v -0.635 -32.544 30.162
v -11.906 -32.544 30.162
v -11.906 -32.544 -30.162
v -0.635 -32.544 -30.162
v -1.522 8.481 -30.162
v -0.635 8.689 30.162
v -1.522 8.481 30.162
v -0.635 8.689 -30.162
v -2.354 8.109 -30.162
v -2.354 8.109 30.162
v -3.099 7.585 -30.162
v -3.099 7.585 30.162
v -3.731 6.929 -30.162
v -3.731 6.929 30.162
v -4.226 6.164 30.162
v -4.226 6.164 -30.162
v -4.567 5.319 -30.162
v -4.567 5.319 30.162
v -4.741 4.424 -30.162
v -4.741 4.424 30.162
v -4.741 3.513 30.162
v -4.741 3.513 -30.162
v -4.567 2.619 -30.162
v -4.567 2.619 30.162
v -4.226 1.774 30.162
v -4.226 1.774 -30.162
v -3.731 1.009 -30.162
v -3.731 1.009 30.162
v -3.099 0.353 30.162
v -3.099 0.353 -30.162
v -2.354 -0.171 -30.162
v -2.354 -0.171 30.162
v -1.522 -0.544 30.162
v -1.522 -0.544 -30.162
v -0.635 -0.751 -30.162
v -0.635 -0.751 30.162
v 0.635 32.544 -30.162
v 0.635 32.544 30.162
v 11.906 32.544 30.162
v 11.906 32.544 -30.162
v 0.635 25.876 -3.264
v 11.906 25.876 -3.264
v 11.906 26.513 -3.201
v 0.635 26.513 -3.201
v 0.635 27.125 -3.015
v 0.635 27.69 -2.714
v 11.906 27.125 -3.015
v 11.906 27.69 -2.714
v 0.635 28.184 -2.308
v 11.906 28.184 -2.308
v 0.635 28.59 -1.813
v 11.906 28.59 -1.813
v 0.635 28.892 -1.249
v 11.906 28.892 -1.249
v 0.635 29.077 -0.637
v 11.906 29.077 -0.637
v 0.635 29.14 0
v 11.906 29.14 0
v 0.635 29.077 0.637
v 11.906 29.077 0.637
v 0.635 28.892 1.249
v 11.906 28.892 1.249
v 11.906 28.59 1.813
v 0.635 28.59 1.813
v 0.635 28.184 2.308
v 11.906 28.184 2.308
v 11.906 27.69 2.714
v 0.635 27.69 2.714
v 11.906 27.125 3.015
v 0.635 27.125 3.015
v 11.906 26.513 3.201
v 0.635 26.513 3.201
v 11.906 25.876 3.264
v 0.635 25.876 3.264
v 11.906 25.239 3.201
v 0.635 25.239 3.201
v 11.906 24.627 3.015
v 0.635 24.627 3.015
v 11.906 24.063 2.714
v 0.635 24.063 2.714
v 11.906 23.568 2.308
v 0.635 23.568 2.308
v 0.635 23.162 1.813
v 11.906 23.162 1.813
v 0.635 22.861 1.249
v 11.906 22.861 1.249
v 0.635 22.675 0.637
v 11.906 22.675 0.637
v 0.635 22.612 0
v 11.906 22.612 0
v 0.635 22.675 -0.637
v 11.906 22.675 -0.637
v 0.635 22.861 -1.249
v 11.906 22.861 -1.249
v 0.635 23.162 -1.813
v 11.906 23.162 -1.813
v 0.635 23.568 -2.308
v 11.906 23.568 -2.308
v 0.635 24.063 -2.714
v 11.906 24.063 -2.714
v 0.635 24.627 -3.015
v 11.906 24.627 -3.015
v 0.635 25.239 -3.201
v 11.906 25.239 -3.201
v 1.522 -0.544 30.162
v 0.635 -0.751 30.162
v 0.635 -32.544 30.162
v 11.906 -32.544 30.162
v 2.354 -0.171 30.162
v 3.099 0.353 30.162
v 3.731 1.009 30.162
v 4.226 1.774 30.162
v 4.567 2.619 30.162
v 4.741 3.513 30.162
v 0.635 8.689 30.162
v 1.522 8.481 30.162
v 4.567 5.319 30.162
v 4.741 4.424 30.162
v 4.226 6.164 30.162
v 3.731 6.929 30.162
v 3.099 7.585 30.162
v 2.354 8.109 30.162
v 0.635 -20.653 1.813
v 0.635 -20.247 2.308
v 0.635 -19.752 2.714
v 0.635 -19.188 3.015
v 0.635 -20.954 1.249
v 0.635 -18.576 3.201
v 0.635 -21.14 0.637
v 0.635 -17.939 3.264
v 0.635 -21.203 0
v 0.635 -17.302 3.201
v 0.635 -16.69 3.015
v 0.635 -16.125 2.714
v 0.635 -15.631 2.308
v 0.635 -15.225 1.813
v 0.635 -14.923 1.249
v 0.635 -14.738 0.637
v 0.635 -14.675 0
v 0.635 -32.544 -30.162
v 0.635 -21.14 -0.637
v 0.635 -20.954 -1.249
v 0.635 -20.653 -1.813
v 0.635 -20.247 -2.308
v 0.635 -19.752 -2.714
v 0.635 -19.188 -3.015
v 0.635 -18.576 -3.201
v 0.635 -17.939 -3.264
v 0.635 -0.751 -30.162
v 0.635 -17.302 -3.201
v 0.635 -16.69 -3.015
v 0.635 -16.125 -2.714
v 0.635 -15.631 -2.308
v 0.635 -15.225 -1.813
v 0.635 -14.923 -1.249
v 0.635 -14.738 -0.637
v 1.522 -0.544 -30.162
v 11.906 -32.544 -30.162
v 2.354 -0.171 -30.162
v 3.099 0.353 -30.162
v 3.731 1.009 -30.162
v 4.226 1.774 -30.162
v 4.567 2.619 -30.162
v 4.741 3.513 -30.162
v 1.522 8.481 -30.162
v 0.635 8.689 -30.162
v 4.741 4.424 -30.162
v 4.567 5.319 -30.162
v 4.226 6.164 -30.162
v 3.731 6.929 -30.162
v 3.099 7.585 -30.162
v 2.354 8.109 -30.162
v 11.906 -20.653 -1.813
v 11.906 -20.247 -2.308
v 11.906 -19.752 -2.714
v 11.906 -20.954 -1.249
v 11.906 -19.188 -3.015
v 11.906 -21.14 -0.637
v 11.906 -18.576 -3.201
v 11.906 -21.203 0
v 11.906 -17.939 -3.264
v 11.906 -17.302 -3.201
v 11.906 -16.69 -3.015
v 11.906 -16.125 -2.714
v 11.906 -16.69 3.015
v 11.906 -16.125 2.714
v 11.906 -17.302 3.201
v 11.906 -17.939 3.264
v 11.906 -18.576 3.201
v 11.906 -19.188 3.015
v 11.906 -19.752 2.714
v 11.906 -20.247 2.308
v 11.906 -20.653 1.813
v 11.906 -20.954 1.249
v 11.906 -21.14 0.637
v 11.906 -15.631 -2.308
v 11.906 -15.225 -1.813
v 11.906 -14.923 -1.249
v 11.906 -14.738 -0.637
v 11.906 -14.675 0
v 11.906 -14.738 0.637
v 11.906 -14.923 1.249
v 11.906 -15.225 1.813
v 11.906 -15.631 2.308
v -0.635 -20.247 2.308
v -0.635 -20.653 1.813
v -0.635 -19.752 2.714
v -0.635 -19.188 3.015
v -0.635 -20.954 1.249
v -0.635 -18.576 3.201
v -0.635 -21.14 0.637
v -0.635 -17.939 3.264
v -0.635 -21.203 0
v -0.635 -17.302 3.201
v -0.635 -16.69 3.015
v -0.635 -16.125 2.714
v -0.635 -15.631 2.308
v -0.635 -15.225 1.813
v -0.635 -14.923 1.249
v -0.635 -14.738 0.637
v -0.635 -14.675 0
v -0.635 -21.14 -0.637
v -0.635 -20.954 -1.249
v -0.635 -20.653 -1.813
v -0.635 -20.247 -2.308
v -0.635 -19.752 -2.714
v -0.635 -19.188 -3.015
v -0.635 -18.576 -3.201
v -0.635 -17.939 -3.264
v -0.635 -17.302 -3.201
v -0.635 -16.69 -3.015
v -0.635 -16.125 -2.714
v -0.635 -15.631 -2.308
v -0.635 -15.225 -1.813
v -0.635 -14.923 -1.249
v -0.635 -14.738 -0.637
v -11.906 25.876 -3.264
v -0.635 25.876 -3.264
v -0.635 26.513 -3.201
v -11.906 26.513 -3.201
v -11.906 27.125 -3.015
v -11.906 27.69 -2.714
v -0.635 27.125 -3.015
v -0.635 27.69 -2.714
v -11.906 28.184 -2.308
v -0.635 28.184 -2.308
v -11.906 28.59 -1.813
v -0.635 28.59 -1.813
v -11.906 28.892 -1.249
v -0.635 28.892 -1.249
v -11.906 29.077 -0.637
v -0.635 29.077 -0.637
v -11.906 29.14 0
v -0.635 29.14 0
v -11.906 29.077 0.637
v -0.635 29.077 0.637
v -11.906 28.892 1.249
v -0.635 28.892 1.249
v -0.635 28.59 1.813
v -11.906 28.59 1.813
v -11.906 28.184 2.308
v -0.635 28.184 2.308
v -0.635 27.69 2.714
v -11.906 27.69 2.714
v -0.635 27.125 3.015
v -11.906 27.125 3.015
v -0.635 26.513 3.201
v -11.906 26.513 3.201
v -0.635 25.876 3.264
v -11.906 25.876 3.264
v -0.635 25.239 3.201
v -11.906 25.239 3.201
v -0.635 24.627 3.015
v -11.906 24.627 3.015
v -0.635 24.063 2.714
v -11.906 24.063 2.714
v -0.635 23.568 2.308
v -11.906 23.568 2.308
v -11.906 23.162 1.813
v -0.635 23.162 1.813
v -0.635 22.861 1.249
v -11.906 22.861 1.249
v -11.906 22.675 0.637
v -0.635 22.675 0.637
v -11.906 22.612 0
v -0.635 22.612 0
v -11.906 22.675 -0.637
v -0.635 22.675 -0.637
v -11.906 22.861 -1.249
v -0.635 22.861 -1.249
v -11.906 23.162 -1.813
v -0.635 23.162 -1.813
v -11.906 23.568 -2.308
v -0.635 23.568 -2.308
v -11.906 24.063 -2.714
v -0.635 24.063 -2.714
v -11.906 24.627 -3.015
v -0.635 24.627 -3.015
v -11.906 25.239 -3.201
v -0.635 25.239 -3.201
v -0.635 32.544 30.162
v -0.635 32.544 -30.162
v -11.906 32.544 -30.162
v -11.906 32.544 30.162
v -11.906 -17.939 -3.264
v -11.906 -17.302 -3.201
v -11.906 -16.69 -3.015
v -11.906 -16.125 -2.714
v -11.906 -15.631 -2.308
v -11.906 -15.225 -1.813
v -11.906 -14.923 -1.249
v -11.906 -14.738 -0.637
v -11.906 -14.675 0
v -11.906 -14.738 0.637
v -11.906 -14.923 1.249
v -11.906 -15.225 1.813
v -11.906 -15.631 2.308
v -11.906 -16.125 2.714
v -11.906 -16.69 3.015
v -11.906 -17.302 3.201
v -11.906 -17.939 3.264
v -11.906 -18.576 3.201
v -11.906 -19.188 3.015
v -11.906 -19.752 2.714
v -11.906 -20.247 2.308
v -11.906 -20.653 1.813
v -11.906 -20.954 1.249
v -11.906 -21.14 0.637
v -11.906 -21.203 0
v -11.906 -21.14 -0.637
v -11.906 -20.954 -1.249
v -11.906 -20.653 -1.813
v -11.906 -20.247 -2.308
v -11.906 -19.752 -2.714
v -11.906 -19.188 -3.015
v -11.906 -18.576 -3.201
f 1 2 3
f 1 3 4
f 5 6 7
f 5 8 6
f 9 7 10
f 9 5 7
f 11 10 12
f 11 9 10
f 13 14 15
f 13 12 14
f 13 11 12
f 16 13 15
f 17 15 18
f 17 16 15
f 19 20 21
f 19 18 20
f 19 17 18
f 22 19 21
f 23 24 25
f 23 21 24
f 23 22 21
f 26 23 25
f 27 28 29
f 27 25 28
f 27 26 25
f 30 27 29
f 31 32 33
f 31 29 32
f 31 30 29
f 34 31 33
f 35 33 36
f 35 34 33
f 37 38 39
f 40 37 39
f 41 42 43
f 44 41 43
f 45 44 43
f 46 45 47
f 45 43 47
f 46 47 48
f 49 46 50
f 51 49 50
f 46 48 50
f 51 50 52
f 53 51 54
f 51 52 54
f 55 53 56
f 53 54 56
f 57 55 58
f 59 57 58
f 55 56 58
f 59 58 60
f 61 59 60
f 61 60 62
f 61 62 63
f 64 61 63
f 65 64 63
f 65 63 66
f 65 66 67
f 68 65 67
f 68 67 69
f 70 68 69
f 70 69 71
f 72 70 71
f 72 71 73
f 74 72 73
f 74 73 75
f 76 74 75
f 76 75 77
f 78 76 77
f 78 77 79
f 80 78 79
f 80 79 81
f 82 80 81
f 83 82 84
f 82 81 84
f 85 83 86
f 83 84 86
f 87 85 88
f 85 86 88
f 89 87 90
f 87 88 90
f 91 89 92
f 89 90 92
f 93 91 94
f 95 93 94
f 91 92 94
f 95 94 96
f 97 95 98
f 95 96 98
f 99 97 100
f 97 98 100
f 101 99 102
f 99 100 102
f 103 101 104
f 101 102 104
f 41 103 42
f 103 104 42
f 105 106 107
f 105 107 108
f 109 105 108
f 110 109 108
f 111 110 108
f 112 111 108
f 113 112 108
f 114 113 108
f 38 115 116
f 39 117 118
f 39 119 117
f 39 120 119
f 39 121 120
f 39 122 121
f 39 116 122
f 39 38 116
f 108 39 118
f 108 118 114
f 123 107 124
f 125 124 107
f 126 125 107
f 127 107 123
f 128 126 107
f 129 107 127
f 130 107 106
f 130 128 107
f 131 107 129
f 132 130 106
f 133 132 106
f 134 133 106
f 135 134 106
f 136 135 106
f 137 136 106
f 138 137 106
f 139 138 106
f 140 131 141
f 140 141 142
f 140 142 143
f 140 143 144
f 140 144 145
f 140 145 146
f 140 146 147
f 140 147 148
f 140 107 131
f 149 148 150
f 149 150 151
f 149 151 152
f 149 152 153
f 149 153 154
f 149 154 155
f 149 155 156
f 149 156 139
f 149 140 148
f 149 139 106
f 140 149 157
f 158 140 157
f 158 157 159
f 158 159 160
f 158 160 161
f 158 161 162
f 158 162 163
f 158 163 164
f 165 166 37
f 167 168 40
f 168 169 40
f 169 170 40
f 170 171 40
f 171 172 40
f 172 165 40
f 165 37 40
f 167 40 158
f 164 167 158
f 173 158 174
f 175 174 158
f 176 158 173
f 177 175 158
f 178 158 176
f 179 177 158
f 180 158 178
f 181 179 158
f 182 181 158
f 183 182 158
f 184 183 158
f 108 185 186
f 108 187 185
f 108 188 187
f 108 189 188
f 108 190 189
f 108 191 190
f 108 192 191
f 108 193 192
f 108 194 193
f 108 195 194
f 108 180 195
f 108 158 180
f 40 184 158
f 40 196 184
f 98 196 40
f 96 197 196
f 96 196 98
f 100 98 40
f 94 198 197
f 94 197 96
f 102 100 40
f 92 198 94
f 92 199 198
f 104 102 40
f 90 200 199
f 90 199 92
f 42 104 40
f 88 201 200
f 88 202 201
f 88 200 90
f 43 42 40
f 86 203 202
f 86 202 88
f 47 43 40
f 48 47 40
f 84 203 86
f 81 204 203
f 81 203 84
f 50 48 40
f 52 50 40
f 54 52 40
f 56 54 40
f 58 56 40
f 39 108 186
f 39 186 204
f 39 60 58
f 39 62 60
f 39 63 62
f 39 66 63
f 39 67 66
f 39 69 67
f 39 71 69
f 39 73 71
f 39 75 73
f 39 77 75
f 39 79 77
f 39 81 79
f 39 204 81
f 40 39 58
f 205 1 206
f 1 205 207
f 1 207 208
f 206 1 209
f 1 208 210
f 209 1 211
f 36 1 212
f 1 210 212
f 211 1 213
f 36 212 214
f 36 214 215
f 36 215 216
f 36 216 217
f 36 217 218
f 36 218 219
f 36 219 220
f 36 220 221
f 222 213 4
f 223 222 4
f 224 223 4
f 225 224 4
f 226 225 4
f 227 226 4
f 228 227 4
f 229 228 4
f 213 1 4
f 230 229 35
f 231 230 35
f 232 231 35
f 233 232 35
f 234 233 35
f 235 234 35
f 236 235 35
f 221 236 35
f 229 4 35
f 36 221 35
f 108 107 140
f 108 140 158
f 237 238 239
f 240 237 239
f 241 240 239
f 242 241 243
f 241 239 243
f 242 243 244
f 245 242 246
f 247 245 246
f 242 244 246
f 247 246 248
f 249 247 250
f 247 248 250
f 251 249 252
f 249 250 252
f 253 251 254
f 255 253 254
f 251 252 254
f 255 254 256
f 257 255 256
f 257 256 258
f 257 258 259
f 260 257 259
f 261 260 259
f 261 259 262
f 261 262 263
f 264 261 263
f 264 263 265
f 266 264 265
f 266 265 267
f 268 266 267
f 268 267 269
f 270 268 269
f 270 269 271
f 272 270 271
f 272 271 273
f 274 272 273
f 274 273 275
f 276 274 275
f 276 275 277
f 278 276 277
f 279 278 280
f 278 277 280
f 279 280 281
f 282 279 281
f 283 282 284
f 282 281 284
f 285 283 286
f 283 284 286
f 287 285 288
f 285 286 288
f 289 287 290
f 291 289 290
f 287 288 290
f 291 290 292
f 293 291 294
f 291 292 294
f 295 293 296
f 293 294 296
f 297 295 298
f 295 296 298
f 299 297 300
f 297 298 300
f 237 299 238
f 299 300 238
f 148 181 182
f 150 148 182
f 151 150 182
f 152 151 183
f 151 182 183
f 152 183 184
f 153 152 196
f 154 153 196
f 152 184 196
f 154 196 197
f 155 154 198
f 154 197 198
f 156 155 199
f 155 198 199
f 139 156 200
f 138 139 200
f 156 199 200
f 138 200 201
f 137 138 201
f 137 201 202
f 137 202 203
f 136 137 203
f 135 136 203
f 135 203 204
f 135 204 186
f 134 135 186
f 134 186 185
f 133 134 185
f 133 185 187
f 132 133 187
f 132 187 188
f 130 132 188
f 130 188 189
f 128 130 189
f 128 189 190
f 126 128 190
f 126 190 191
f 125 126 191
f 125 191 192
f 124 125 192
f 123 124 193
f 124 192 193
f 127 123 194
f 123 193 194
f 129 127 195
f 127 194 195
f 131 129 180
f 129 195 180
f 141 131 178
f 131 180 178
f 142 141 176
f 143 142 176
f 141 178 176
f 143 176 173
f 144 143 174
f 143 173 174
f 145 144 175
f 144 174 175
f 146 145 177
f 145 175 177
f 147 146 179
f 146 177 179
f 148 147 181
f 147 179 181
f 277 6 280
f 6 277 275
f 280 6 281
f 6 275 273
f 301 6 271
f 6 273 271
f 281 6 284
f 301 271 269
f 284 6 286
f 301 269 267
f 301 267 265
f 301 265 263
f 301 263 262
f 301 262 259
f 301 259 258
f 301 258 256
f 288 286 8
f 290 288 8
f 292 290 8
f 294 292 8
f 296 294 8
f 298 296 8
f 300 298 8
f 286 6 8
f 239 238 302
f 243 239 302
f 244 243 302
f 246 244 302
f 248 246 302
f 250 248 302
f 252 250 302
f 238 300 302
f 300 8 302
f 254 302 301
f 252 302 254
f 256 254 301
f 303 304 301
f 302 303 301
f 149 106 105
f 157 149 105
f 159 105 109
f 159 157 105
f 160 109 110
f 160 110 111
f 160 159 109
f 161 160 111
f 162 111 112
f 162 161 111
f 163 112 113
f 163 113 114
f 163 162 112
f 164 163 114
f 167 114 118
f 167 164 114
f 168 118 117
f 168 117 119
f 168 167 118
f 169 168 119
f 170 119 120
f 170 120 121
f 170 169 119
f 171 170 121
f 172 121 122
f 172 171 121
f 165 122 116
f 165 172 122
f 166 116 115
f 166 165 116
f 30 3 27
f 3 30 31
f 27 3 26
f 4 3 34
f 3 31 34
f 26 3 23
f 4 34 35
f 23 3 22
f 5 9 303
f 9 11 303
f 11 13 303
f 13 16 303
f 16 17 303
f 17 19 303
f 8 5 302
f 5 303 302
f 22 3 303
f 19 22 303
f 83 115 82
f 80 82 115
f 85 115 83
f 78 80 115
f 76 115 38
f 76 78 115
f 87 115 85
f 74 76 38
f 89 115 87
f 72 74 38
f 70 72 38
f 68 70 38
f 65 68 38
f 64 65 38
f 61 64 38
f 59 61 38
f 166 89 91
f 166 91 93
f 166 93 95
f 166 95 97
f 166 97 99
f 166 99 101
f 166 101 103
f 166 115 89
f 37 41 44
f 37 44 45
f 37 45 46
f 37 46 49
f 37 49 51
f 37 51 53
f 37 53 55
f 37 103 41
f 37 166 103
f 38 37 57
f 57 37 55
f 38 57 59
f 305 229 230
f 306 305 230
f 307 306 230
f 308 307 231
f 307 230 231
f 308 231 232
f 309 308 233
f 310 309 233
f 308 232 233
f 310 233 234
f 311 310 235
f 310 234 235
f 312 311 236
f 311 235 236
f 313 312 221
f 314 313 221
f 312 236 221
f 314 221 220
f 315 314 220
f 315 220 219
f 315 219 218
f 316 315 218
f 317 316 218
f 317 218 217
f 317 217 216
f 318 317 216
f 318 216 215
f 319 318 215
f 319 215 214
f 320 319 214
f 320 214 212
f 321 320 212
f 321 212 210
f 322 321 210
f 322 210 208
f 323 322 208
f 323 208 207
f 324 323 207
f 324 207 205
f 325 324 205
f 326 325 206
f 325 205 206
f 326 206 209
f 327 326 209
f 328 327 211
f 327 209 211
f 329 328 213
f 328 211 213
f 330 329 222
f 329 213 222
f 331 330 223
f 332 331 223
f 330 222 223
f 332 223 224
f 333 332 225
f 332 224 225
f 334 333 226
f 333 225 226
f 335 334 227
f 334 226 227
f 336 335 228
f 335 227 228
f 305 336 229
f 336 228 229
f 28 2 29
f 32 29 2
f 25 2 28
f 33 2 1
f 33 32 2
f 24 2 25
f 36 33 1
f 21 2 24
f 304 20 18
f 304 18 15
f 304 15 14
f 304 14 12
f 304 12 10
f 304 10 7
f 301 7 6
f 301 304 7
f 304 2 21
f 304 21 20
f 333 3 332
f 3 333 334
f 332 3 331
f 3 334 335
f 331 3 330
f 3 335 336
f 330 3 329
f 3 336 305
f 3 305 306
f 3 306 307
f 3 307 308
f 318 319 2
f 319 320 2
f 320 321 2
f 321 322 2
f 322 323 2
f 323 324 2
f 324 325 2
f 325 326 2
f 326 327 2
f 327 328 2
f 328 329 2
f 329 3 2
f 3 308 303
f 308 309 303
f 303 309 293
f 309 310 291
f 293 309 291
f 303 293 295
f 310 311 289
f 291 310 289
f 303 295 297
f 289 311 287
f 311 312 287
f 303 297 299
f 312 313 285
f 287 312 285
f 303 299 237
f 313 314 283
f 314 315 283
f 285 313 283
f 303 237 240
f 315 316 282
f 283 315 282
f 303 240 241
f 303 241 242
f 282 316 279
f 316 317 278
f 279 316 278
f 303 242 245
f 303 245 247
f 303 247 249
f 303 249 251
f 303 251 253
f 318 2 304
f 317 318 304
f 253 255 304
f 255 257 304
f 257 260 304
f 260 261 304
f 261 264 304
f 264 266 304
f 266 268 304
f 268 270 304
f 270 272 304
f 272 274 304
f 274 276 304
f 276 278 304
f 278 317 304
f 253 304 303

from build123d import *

# Parameters (mm, degrees)
SKETCH1_W               = 23.8125
SKETCH1_H               = 65.0875
SKETCH1_R               = 0.4699
SKETCH1_R_2             = 4.7625
BOSS_EXTRUDE1_DEPTH     = 30.1625
F_1_4_CLEARANCE_HOLE1_D = 6.5278
CUT_EXTRUDE1_DEPTH      = 46.941602708
CUT_EXTRUDE1_DEPTH_BACK = 46.941602708
SKETCH4_W               = 1.27
SKETCH4_H               = 65.0875


with BuildPart() as part:
    # Sketch1 → Boss-Extrude1 (new, symmetric)
    with BuildSketch(Plane.XY):
        Rectangle(SKETCH1_W, SKETCH1_H)
        with Locations((0, -13.49375)):
            Circle(SKETCH1_R, mode=Mode.SUBTRACT)
        with Locations((0, 21.43125)):
            Circle(SKETCH1_R, mode=Mode.SUBTRACT)
        with Locations(Location((0, 3.96875, 0), (0, 0, 180))):
            Circle(SKETCH1_R_2, mode=Mode.SUBTRACT)
    extrude(amount=BOSS_EXTRUDE1_DEPTH, both=True)

    # 1/4 Clearance Hole1 (through all)
    with Locations(Plane.ZY.offset(11.90625)):
        with Locations((0, 25.87625), (0, -17.93875)):
            Hole(F_1_4_CLEARANCE_HOLE1_D / 2)

    # Sketch4 → Cut-Extrude1 (cut, two sides: drawn at the far end of the back side and taken through both)
    with BuildSketch(Plane.XY.offset(-CUT_EXTRUDE1_DEPTH_BACK)):
        Rectangle(SKETCH4_W, SKETCH4_H)
    extrude(amount=CUT_EXTRUDE1_DEPTH + CUT_EXTRUDE1_DEPTH_BACK, mode=Mode.SUBTRACT)


with BuildPart() as cut_extrude1_piece_1:
    # of the separate pieces the step leaves, piece 1, a body of its own (cut_extrude1_pieces)
    add(part.part.solids().sort_by_distance((0.635, -32.54375, -30.1625))[0])


with BuildPart() as cut_extrude1_piece_2:
    # of the separate pieces the step leaves, piece 2, a body of its own (cut_extrude1_pieces)
    add(part.part.solids().sort_by_distance((-11.90625, -32.54375, 30.1625))[0])


solid = Compound([cut_extrude1_piece_1.part, cut_extrude1_piece_2.part])
